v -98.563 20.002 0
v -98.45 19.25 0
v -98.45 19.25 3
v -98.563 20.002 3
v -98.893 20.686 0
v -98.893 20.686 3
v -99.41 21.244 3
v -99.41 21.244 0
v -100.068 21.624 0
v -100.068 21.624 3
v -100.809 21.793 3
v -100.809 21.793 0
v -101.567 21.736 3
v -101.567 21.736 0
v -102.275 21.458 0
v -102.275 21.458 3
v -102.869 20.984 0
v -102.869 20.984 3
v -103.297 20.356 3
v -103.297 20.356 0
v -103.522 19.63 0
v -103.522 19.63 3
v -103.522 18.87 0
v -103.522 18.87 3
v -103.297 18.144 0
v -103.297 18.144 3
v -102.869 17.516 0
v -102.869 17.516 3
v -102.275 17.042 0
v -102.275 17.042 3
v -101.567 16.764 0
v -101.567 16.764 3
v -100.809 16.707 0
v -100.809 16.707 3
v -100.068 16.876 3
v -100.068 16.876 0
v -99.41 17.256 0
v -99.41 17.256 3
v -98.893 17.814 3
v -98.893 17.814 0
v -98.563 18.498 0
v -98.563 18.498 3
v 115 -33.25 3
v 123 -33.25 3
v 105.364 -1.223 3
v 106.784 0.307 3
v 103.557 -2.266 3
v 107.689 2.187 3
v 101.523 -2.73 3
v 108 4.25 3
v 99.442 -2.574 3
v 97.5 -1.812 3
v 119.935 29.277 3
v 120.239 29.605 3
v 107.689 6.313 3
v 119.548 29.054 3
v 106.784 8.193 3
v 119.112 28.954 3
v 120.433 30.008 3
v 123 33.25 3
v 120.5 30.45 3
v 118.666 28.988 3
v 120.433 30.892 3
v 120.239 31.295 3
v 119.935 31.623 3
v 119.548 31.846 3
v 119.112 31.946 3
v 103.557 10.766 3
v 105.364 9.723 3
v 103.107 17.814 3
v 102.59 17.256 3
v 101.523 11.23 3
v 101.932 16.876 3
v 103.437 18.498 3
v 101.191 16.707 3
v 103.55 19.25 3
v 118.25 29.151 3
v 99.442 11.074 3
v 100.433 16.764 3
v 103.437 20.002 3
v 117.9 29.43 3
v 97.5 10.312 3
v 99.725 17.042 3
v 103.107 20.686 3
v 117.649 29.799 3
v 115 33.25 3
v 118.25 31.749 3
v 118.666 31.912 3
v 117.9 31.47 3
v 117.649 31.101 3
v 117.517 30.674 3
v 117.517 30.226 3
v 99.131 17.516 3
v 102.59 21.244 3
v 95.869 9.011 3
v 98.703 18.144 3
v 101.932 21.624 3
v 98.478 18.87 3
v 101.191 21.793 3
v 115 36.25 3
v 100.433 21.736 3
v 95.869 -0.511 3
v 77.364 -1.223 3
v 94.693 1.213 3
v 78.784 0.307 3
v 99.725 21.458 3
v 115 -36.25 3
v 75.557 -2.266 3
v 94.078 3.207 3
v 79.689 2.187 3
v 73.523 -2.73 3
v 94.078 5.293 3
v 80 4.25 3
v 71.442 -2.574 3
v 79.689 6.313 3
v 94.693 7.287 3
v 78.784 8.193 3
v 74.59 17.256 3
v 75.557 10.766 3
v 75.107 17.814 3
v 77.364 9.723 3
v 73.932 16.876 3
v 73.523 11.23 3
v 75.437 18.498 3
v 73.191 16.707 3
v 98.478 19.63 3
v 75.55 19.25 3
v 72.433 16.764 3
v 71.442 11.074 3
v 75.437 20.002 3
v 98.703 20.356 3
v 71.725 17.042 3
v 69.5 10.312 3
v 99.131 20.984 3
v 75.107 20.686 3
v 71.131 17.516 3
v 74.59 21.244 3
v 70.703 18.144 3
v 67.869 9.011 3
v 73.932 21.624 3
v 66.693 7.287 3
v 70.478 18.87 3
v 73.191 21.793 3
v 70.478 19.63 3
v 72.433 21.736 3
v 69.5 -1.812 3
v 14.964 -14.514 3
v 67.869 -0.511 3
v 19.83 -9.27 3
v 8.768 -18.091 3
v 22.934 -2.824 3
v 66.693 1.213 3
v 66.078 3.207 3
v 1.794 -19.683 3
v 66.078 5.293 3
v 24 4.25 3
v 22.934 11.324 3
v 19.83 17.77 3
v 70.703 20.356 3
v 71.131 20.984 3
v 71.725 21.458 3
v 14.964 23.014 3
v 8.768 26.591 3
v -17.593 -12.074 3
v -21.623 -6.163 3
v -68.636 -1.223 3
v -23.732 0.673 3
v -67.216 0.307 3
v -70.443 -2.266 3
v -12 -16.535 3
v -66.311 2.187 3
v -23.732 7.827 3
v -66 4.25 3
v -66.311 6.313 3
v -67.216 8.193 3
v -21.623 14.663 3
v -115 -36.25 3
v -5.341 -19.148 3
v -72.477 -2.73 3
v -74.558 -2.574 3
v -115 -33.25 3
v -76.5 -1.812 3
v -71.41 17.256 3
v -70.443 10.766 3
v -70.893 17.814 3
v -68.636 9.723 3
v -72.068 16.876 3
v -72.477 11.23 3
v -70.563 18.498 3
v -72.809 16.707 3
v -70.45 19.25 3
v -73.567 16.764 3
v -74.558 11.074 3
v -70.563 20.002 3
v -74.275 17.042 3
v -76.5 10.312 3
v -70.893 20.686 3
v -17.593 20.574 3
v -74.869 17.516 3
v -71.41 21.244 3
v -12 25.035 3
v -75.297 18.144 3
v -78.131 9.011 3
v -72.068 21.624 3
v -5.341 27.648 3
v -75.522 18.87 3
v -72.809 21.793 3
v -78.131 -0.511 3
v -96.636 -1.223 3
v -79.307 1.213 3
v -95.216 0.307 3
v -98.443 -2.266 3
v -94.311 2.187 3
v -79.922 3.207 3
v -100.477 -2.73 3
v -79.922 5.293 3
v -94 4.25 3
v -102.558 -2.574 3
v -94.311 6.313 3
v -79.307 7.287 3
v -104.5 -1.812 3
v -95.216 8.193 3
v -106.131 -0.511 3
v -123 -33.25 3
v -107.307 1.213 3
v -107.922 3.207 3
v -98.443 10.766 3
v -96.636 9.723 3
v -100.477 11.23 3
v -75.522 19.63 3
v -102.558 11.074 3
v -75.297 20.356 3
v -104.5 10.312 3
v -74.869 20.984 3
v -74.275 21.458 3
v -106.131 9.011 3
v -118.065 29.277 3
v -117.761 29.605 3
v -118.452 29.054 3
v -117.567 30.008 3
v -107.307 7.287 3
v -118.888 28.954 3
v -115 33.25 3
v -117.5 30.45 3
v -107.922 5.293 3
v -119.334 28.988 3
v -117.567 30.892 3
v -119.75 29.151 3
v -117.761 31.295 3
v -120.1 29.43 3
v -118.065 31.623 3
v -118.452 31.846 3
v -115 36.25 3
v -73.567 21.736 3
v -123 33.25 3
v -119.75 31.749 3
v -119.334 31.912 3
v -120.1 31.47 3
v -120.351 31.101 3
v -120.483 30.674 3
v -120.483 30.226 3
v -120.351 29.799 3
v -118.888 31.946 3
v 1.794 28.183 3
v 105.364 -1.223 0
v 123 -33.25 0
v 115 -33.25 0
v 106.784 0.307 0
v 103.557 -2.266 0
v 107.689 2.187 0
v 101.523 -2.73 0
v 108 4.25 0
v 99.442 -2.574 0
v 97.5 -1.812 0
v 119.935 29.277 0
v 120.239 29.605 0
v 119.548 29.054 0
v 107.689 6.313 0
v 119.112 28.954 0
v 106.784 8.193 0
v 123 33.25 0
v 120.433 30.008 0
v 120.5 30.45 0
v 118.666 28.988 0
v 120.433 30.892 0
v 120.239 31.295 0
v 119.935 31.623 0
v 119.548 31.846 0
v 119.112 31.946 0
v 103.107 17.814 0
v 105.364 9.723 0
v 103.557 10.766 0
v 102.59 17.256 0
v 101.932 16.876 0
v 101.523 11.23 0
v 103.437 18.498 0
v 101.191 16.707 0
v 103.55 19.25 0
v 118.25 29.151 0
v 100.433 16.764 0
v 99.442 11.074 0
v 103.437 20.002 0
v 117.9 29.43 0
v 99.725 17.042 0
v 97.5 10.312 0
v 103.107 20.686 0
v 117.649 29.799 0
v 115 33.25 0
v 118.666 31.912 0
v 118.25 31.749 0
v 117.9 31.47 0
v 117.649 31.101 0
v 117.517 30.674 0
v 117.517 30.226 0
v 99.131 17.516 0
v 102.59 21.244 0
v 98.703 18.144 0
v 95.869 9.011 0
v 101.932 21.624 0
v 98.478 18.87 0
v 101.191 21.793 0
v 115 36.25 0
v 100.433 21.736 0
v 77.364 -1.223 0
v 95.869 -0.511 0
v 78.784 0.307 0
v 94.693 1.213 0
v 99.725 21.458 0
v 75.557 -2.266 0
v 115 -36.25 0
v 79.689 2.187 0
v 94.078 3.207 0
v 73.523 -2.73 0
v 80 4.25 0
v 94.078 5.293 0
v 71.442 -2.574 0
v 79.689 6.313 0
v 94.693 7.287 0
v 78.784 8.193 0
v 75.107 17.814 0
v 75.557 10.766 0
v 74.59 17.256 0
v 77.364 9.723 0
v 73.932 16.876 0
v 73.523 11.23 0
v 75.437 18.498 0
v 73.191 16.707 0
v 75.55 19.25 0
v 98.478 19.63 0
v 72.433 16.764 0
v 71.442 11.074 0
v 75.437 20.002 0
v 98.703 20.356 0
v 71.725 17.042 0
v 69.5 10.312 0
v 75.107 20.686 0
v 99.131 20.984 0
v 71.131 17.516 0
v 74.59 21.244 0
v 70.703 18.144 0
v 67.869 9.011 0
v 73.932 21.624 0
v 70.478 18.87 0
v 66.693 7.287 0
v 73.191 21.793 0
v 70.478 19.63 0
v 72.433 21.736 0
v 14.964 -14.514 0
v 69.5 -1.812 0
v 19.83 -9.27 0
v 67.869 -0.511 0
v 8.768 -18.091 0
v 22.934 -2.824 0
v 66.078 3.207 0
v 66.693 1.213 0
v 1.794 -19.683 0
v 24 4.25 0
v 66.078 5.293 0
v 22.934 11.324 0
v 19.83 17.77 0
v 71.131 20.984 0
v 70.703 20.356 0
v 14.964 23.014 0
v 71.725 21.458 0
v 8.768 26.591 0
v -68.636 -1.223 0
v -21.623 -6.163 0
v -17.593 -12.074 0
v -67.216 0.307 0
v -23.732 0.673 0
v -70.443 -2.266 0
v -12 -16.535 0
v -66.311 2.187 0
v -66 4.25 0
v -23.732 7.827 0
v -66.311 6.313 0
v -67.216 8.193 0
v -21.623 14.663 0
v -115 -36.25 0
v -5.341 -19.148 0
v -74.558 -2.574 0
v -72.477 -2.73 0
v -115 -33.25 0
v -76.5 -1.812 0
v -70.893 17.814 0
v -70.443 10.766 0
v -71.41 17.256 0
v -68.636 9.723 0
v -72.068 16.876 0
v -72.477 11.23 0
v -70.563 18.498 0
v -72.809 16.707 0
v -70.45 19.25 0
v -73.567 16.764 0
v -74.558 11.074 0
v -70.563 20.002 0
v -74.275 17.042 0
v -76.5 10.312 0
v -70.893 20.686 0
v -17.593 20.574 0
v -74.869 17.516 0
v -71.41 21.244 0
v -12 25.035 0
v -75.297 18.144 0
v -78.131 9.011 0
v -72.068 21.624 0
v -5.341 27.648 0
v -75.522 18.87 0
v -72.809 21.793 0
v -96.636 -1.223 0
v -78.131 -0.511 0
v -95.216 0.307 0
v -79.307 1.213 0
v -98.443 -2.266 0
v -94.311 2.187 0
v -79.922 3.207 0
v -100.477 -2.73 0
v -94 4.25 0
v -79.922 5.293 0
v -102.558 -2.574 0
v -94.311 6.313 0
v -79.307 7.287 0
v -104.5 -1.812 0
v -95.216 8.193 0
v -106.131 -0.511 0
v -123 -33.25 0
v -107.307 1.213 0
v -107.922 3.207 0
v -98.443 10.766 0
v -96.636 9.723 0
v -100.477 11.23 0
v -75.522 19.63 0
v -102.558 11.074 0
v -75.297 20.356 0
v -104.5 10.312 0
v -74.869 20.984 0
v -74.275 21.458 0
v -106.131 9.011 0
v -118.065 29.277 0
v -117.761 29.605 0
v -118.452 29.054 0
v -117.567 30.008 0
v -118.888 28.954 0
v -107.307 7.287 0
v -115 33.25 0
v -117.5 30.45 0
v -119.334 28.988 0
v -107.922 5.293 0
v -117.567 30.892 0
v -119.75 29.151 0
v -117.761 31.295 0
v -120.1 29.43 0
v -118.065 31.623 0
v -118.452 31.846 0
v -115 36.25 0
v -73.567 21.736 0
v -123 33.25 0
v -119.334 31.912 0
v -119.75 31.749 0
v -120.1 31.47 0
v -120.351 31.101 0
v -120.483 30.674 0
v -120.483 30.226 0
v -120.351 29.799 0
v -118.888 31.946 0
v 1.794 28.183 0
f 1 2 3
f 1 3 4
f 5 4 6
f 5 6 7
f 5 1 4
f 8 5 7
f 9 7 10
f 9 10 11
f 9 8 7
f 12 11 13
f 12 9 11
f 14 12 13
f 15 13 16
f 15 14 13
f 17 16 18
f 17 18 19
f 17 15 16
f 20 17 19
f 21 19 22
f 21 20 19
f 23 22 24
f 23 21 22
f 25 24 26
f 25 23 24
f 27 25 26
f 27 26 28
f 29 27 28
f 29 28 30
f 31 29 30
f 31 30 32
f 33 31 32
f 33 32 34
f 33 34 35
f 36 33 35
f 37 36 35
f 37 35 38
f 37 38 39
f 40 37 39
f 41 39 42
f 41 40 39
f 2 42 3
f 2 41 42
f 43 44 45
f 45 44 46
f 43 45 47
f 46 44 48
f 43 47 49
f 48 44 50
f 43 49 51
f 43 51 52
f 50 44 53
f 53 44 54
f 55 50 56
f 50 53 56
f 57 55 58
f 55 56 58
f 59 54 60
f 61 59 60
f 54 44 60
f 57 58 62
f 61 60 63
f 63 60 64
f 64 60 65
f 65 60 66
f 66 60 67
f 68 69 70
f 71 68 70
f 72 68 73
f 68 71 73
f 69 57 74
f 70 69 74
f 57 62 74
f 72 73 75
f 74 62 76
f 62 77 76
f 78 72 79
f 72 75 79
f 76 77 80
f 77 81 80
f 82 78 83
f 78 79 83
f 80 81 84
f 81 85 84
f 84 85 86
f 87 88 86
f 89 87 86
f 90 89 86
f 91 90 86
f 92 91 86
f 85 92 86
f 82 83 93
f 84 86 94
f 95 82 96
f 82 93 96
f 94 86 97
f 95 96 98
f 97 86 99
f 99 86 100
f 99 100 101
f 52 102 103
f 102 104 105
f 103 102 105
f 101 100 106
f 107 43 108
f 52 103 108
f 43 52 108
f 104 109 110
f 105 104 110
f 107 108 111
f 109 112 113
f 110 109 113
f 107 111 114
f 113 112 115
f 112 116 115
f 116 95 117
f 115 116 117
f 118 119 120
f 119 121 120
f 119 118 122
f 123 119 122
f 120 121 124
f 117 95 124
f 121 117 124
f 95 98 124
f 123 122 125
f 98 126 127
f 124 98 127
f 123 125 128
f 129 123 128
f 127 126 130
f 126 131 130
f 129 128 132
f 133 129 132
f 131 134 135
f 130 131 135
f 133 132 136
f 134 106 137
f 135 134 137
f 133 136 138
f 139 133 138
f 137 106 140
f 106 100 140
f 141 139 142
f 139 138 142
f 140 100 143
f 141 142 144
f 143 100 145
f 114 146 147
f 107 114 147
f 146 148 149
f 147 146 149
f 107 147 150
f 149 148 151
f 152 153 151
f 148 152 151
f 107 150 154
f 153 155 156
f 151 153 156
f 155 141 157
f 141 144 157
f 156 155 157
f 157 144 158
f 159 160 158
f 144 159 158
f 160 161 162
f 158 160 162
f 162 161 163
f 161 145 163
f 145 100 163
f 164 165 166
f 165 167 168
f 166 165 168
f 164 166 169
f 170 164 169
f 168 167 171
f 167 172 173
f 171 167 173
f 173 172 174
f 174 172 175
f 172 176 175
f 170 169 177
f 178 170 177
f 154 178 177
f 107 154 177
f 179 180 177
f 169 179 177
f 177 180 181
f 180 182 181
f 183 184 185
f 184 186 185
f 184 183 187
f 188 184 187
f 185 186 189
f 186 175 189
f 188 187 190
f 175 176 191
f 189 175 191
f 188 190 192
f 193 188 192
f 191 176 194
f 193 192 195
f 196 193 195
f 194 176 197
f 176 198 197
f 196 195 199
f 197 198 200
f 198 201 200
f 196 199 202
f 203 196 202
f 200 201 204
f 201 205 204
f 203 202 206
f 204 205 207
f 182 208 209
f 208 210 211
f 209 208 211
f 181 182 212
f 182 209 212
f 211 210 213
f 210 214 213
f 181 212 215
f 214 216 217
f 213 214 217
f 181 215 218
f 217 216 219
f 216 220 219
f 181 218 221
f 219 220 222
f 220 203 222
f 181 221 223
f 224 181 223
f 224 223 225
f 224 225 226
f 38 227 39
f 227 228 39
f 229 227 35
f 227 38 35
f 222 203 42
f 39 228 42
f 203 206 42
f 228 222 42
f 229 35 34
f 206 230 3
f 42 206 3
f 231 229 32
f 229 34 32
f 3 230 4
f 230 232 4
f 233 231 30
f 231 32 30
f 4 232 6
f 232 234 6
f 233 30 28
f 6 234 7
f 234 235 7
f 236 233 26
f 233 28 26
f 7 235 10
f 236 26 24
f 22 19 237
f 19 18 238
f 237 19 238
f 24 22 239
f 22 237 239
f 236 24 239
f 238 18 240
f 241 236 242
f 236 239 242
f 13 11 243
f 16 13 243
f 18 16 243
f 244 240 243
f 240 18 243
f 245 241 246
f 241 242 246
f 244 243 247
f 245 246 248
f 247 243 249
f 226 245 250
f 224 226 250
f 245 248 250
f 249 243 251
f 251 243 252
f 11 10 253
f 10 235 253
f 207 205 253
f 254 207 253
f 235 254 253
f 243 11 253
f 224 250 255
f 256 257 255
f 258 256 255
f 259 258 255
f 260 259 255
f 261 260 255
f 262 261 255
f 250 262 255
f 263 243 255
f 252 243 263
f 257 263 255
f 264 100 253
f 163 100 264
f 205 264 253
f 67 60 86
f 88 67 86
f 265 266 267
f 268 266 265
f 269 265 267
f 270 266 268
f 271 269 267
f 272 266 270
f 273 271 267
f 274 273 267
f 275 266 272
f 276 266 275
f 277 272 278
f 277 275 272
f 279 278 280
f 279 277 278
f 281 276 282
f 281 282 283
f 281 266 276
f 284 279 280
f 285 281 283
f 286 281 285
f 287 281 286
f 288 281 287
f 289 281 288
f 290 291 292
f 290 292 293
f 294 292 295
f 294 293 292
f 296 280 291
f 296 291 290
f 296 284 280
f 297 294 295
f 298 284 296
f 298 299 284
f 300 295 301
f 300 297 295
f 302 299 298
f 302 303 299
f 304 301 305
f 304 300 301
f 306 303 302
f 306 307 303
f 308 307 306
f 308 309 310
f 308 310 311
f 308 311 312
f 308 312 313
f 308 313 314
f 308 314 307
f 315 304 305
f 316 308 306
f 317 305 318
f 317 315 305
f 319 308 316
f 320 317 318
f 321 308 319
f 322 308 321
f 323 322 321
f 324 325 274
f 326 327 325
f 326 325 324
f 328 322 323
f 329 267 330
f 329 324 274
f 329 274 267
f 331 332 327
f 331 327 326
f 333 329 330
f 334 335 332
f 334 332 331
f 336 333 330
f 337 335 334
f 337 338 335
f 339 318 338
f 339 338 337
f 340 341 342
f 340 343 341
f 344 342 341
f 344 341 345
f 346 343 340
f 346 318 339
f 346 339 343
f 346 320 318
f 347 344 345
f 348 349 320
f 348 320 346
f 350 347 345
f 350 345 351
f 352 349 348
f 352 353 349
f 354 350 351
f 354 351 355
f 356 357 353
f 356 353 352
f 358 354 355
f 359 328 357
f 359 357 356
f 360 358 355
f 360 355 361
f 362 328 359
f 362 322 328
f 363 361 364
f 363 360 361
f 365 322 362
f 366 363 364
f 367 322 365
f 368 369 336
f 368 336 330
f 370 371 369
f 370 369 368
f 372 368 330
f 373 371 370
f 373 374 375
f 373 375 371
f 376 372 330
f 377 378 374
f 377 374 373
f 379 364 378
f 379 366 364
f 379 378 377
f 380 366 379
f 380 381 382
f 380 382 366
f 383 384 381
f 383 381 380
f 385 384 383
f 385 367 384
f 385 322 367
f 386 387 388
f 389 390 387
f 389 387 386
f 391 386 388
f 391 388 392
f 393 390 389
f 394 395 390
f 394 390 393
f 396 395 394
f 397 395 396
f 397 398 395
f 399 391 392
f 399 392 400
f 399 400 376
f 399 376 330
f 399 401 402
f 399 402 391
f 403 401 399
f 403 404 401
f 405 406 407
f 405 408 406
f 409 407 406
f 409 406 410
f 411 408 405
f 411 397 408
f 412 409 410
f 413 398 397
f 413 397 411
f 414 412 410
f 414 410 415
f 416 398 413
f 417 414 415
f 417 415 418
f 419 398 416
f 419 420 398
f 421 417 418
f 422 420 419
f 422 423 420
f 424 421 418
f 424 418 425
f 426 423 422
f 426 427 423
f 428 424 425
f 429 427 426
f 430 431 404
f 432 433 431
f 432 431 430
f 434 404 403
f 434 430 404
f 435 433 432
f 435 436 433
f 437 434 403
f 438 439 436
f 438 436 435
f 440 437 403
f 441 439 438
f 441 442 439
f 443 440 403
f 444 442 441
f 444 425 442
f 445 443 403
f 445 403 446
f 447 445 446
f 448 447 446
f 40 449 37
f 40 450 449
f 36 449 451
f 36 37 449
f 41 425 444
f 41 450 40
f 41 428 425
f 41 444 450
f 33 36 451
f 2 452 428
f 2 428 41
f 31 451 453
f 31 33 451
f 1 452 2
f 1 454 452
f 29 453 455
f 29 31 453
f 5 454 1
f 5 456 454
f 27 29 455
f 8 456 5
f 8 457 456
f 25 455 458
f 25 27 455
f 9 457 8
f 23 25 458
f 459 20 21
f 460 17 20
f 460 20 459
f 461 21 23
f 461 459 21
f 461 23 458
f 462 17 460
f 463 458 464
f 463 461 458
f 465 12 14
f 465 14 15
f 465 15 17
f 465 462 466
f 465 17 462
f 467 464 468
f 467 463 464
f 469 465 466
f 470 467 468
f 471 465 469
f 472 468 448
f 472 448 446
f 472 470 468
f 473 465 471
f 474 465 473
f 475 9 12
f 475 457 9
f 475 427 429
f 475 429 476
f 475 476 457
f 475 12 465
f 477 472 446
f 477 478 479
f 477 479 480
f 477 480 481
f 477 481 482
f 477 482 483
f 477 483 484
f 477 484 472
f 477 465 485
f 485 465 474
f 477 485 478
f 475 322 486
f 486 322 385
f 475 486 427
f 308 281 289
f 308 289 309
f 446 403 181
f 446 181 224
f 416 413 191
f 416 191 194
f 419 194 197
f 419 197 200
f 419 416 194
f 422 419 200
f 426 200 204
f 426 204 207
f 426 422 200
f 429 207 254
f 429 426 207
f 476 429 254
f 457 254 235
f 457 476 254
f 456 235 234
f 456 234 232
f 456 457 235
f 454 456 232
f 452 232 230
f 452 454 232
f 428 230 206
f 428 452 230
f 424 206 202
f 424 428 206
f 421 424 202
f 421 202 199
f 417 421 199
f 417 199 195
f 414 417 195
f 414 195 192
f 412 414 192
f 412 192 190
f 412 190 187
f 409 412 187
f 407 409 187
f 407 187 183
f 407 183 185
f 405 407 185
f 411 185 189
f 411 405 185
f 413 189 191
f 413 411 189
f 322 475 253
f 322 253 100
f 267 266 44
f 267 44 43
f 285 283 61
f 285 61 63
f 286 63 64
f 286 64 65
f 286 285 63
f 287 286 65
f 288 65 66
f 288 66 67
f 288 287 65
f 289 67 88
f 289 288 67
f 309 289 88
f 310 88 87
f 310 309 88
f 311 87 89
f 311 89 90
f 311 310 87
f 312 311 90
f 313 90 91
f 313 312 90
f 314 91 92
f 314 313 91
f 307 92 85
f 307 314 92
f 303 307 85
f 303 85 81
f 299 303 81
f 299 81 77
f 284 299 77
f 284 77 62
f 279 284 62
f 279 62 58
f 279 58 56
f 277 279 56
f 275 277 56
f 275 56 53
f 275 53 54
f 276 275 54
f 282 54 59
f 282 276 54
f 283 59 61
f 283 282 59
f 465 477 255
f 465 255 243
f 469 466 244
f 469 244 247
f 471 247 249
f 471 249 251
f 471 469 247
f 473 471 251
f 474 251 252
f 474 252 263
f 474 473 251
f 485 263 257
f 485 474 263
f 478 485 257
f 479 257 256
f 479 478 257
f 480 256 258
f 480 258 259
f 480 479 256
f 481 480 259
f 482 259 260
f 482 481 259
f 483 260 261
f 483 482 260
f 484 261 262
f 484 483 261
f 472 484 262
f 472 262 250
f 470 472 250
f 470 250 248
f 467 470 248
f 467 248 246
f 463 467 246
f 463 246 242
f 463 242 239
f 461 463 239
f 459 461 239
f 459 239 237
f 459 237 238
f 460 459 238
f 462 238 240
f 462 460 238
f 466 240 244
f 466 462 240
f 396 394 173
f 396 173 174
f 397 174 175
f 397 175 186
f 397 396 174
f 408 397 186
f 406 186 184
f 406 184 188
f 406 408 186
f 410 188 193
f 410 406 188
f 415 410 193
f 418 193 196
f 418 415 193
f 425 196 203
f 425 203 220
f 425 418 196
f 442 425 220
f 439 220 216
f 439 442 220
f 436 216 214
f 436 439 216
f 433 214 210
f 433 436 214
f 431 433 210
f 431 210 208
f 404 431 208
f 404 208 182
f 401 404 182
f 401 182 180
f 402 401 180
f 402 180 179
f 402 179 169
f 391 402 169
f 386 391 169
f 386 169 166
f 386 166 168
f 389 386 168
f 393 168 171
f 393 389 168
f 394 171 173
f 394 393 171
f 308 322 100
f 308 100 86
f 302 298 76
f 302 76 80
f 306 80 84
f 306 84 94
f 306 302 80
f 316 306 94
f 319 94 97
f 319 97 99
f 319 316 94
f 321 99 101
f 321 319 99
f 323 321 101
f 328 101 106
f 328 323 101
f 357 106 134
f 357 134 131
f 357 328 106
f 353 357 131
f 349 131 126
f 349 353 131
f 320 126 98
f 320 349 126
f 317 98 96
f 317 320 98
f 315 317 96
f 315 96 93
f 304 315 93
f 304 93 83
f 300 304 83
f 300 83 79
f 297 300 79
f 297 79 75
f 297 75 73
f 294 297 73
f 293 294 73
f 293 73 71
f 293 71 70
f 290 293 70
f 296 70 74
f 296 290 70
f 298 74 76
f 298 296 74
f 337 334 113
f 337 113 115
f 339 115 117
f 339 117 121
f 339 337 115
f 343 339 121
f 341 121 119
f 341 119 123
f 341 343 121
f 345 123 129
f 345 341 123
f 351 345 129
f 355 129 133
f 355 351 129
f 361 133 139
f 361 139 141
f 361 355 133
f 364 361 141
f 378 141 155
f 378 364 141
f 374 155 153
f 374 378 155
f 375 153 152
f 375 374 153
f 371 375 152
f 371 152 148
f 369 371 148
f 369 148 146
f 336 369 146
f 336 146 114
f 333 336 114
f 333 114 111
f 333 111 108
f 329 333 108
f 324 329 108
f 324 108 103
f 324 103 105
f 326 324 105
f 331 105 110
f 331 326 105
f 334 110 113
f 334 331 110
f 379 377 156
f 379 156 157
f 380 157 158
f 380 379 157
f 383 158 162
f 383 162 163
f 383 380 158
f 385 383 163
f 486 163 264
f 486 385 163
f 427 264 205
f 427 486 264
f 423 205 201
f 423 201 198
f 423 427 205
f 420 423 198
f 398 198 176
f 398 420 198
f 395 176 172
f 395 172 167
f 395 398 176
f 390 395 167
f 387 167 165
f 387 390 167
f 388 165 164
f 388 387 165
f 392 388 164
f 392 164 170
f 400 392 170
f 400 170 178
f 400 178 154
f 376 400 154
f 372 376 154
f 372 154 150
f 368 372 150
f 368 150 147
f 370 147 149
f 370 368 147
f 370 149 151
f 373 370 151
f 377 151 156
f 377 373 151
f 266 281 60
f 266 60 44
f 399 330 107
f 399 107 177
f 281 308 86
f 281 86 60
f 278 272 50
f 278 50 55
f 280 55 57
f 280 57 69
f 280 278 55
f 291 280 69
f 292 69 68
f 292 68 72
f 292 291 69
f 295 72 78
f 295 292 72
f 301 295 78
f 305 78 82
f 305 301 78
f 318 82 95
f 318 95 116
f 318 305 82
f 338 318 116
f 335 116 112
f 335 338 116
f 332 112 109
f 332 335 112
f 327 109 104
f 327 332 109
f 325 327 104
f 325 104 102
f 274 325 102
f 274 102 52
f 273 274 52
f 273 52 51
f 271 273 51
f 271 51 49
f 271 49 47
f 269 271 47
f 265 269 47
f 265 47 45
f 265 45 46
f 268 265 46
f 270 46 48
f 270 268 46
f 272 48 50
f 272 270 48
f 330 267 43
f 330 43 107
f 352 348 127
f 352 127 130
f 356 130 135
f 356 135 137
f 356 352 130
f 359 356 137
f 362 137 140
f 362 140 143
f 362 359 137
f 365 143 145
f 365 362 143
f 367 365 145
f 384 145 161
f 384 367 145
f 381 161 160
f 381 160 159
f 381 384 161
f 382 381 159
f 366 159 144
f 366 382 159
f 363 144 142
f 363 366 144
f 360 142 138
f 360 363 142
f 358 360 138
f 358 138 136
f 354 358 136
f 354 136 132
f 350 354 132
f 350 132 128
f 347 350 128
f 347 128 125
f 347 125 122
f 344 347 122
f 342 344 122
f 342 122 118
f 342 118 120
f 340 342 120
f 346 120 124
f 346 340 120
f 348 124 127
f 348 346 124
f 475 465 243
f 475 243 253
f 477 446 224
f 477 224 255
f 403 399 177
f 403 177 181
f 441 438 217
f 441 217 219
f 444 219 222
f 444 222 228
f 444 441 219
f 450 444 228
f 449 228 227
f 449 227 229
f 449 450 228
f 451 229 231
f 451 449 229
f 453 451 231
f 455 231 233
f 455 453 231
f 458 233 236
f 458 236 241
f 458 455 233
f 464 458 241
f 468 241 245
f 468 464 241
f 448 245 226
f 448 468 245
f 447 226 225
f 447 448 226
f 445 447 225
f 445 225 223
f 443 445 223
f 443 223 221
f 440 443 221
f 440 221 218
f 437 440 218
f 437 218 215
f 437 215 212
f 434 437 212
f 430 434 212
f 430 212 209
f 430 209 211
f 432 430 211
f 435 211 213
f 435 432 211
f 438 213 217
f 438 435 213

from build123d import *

# Parameters (mm, degrees)
SKETCH_R   = 24
SKETCH_R_2 = 7
SKETCH_R_3 = 2.55
SKETCH_R_4 = 1.5
PAD_DEPTH  = 3


with BuildPart() as part:
    # Sketch → Pad (new body)
    with BuildSketch(Plane.XY):
        Polygon((-123, 33.25), (-115, 33.25), (-115, 36.25), (115, 36.25), (115, 33.25), (123, 33.25), (123, -33.25), (115, -33.25), (115, -36.25), (-115, -36.25), (-115, -33.25), (-123, -33.25), align=None)
        with Locations((0, 4.25)):
            Circle(SKETCH_R, mode=Mode.SUBTRACT)
        with Locations((-101, 4.25)):
            Circle(SKETCH_R_2, mode=Mode.SUBTRACT)
        with Locations((-73, 4.25)):
            Circle(SKETCH_R_2, mode=Mode.SUBTRACT)
        with Locations((73, 4.25)):
            Circle(SKETCH_R_2, mode=Mode.SUBTRACT)
        with Locations((101, 4.25)):
            Circle(SKETCH_R_2, mode=Mode.SUBTRACT)
        with Locations((-101, 19.25)):
            Circle(SKETCH_R_3, mode=Mode.SUBTRACT)
        with Locations((-73, 19.25)):
            Circle(SKETCH_R_3, mode=Mode.SUBTRACT)
        with Locations((73, 19.25)):
            Circle(SKETCH_R_3, mode=Mode.SUBTRACT)
        with Locations((101, 19.25)):
            Circle(SKETCH_R_3, mode=Mode.SUBTRACT)
        with Locations((-119, 30.45)):
            Circle(SKETCH_R_4, mode=Mode.SUBTRACT)
        with Locations((119, 30.45)):
            Circle(SKETCH_R_4, mode=Mode.SUBTRACT)
    extrude(amount=PAD_DEPTH)


solid = part.part
